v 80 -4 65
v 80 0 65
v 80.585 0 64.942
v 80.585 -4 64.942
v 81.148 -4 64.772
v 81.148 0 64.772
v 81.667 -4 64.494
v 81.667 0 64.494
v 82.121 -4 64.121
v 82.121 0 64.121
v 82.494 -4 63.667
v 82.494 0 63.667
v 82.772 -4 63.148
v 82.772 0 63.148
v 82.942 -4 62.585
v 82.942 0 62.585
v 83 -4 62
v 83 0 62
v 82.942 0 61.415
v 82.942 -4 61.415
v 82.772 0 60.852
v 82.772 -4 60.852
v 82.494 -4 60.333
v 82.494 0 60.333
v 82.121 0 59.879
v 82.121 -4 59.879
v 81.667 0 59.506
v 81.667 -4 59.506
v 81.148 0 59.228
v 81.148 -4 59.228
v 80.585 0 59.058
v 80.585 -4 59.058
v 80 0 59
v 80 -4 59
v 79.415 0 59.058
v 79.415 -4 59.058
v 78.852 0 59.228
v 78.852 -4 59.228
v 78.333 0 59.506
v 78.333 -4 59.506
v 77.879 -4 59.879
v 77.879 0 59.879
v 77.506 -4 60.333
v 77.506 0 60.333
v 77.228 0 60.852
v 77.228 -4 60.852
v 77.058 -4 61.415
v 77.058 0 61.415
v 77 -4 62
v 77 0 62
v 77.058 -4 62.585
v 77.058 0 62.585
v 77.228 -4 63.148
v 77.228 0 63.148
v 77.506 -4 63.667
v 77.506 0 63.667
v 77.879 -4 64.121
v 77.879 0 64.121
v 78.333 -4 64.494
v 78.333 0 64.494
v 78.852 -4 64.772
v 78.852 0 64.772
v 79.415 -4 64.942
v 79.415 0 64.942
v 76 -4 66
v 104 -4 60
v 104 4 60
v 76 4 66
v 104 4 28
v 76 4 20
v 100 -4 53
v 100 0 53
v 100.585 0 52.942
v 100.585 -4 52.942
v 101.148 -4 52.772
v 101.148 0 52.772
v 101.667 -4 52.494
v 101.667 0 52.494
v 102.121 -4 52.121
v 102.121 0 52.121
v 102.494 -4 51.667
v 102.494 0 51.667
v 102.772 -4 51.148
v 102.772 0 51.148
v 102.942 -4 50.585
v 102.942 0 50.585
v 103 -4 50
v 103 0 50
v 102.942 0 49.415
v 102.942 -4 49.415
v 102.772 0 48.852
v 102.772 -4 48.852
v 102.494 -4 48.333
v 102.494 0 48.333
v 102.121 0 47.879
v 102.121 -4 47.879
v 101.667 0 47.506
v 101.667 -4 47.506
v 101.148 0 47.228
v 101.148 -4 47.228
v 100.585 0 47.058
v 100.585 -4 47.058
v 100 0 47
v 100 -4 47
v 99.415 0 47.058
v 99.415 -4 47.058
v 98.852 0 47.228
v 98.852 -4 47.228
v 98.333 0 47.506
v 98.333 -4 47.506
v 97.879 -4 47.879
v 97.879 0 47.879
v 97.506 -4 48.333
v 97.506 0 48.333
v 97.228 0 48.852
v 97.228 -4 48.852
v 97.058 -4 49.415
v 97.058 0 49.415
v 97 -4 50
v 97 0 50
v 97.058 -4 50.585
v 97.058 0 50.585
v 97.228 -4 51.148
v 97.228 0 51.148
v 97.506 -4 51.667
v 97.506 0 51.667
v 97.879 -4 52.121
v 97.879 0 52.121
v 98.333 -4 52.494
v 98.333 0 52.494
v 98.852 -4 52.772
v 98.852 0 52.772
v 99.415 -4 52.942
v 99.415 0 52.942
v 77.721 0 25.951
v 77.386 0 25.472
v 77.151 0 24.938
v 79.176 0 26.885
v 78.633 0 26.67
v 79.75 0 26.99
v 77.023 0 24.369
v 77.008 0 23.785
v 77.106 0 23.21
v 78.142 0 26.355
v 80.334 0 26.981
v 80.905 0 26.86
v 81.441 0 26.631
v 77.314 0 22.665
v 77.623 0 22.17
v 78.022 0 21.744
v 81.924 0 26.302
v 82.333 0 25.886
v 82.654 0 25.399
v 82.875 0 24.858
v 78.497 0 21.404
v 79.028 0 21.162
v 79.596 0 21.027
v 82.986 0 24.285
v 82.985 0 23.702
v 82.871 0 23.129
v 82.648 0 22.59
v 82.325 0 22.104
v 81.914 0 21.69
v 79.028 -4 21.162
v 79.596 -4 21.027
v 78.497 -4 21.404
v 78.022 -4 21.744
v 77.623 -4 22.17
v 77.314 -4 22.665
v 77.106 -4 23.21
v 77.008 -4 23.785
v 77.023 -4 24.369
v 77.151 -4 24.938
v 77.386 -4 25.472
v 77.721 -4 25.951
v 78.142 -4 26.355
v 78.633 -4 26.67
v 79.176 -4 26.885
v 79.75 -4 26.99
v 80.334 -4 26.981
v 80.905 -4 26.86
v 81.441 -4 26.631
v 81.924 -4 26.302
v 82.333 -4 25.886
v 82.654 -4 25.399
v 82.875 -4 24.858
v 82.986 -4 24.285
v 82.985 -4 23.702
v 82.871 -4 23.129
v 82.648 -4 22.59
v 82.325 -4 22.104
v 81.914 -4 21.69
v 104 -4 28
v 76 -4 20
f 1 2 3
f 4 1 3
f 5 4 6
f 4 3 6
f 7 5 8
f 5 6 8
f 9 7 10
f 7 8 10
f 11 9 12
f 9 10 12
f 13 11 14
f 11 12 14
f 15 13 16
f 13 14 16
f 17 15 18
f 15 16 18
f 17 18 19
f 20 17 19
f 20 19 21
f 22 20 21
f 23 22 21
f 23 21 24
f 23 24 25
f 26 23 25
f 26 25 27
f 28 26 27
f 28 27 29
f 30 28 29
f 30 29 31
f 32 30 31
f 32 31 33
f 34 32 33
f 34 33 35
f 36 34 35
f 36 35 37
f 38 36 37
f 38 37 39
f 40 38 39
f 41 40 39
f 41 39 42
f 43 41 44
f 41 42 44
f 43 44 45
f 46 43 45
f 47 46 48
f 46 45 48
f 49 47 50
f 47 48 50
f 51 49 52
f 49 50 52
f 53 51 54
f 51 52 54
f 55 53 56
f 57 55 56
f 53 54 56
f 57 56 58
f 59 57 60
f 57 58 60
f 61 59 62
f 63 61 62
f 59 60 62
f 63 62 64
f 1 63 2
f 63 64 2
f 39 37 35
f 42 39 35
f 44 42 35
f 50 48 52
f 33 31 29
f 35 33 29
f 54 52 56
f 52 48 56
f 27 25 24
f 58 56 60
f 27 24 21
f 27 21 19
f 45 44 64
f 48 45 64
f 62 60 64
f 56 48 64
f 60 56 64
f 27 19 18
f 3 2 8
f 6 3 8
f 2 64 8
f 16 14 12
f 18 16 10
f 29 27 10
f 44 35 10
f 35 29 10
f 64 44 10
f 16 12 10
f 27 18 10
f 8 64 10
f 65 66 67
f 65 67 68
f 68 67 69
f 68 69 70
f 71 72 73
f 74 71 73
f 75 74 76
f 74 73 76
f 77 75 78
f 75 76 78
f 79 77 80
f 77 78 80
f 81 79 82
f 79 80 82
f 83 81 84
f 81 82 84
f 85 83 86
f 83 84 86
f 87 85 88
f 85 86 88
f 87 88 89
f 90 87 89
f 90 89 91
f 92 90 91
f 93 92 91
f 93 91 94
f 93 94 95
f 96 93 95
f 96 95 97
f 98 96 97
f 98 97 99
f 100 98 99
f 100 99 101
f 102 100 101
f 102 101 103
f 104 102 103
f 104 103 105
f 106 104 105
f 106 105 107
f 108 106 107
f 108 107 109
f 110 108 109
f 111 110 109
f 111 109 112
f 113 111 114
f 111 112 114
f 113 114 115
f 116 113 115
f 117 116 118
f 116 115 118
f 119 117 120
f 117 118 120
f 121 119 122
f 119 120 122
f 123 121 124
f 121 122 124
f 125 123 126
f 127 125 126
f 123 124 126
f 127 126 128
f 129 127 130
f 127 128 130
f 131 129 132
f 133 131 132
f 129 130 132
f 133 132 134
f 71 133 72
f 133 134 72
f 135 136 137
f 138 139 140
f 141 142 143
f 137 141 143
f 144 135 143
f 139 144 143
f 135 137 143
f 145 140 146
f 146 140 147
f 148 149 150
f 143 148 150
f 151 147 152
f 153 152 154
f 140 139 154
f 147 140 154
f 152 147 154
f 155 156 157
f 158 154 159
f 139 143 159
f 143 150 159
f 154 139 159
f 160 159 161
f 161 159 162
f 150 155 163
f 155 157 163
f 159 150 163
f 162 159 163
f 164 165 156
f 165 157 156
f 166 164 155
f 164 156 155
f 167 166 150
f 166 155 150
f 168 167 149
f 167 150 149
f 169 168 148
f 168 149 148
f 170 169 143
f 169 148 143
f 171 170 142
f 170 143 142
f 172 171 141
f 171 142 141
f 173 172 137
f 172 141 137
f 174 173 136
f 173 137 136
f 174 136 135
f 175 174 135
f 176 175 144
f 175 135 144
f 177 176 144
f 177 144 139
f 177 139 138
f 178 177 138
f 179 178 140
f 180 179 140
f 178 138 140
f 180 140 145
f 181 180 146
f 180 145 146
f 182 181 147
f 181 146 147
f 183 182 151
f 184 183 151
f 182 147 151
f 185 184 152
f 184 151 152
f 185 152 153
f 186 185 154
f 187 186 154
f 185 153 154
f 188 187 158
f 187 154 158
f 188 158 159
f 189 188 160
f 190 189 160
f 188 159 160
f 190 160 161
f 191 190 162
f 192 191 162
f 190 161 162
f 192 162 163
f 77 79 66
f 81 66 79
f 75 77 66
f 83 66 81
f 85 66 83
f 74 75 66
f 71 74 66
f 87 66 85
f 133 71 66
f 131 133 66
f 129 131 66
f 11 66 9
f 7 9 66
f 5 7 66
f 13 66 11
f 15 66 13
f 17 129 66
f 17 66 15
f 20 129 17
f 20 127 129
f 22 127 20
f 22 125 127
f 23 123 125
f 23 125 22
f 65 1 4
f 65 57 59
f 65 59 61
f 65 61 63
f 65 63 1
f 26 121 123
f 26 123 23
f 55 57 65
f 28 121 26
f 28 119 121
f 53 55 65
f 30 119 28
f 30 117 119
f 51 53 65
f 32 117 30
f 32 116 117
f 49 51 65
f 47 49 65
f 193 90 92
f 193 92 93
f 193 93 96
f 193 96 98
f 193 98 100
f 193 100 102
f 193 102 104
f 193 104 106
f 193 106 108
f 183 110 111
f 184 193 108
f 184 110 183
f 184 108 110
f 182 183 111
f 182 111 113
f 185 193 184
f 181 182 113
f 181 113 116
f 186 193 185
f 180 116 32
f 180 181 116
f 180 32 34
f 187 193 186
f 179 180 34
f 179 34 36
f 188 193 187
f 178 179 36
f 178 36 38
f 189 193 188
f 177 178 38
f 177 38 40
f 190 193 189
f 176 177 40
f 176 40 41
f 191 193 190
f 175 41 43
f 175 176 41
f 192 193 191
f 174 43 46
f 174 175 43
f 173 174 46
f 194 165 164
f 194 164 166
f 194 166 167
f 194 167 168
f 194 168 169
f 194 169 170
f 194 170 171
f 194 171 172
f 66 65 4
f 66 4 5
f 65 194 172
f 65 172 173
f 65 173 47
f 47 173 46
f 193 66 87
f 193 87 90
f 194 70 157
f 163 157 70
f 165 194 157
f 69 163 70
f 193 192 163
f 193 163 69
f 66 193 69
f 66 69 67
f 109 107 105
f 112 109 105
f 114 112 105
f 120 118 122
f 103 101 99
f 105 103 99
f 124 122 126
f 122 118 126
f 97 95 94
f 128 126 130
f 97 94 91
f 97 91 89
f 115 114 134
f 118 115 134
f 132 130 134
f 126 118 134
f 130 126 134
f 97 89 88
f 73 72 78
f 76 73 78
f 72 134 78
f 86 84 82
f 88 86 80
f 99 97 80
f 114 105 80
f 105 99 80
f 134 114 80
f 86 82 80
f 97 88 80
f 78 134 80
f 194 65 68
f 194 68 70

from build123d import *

# Parameters (mm, degrees)
EXTRUDE_START       = -4
EXTRUDE_1_DEPTH     = 8
SKETCH_2_R          = 3
CUT_EXTRUDE_1_DEPTH = 124.239604024


with BuildPart() as part:
    # 草图1 → 凸台-拉伸1 (new body)
    with BuildSketch(Plane(origin=(0, 0, 0), x_dir=(1, 0, 0), z_dir=(0, 1, 0)).offset(EXTRUDE_START)):
        Polygon((76, -66), (76, -20), (104, -28), (104, -60), align=None)
    extrude(amount=EXTRUDE_1_DEPTH)

    # 草图2 → 切除-拉伸1 (cut, through all)
    with BuildSketch(Plane(origin=(0, 0, 0), x_dir=(1, 0, 0), z_dir=(0, 1, 0))):
        with Locations(Location((80, -62, 0), (0, 0, 270))):
            Circle(SKETCH_2_R)
        with Locations((80, -24)):
            Circle(SKETCH_2_R)
        with Locations(Location((100, -50, 0), (0, 0, 270))):
            Circle(SKETCH_2_R)
    extrude(amount=-CUT_EXTRUDE_1_DEPTH, mode=Mode.SUBTRACT)


solid = part.part
